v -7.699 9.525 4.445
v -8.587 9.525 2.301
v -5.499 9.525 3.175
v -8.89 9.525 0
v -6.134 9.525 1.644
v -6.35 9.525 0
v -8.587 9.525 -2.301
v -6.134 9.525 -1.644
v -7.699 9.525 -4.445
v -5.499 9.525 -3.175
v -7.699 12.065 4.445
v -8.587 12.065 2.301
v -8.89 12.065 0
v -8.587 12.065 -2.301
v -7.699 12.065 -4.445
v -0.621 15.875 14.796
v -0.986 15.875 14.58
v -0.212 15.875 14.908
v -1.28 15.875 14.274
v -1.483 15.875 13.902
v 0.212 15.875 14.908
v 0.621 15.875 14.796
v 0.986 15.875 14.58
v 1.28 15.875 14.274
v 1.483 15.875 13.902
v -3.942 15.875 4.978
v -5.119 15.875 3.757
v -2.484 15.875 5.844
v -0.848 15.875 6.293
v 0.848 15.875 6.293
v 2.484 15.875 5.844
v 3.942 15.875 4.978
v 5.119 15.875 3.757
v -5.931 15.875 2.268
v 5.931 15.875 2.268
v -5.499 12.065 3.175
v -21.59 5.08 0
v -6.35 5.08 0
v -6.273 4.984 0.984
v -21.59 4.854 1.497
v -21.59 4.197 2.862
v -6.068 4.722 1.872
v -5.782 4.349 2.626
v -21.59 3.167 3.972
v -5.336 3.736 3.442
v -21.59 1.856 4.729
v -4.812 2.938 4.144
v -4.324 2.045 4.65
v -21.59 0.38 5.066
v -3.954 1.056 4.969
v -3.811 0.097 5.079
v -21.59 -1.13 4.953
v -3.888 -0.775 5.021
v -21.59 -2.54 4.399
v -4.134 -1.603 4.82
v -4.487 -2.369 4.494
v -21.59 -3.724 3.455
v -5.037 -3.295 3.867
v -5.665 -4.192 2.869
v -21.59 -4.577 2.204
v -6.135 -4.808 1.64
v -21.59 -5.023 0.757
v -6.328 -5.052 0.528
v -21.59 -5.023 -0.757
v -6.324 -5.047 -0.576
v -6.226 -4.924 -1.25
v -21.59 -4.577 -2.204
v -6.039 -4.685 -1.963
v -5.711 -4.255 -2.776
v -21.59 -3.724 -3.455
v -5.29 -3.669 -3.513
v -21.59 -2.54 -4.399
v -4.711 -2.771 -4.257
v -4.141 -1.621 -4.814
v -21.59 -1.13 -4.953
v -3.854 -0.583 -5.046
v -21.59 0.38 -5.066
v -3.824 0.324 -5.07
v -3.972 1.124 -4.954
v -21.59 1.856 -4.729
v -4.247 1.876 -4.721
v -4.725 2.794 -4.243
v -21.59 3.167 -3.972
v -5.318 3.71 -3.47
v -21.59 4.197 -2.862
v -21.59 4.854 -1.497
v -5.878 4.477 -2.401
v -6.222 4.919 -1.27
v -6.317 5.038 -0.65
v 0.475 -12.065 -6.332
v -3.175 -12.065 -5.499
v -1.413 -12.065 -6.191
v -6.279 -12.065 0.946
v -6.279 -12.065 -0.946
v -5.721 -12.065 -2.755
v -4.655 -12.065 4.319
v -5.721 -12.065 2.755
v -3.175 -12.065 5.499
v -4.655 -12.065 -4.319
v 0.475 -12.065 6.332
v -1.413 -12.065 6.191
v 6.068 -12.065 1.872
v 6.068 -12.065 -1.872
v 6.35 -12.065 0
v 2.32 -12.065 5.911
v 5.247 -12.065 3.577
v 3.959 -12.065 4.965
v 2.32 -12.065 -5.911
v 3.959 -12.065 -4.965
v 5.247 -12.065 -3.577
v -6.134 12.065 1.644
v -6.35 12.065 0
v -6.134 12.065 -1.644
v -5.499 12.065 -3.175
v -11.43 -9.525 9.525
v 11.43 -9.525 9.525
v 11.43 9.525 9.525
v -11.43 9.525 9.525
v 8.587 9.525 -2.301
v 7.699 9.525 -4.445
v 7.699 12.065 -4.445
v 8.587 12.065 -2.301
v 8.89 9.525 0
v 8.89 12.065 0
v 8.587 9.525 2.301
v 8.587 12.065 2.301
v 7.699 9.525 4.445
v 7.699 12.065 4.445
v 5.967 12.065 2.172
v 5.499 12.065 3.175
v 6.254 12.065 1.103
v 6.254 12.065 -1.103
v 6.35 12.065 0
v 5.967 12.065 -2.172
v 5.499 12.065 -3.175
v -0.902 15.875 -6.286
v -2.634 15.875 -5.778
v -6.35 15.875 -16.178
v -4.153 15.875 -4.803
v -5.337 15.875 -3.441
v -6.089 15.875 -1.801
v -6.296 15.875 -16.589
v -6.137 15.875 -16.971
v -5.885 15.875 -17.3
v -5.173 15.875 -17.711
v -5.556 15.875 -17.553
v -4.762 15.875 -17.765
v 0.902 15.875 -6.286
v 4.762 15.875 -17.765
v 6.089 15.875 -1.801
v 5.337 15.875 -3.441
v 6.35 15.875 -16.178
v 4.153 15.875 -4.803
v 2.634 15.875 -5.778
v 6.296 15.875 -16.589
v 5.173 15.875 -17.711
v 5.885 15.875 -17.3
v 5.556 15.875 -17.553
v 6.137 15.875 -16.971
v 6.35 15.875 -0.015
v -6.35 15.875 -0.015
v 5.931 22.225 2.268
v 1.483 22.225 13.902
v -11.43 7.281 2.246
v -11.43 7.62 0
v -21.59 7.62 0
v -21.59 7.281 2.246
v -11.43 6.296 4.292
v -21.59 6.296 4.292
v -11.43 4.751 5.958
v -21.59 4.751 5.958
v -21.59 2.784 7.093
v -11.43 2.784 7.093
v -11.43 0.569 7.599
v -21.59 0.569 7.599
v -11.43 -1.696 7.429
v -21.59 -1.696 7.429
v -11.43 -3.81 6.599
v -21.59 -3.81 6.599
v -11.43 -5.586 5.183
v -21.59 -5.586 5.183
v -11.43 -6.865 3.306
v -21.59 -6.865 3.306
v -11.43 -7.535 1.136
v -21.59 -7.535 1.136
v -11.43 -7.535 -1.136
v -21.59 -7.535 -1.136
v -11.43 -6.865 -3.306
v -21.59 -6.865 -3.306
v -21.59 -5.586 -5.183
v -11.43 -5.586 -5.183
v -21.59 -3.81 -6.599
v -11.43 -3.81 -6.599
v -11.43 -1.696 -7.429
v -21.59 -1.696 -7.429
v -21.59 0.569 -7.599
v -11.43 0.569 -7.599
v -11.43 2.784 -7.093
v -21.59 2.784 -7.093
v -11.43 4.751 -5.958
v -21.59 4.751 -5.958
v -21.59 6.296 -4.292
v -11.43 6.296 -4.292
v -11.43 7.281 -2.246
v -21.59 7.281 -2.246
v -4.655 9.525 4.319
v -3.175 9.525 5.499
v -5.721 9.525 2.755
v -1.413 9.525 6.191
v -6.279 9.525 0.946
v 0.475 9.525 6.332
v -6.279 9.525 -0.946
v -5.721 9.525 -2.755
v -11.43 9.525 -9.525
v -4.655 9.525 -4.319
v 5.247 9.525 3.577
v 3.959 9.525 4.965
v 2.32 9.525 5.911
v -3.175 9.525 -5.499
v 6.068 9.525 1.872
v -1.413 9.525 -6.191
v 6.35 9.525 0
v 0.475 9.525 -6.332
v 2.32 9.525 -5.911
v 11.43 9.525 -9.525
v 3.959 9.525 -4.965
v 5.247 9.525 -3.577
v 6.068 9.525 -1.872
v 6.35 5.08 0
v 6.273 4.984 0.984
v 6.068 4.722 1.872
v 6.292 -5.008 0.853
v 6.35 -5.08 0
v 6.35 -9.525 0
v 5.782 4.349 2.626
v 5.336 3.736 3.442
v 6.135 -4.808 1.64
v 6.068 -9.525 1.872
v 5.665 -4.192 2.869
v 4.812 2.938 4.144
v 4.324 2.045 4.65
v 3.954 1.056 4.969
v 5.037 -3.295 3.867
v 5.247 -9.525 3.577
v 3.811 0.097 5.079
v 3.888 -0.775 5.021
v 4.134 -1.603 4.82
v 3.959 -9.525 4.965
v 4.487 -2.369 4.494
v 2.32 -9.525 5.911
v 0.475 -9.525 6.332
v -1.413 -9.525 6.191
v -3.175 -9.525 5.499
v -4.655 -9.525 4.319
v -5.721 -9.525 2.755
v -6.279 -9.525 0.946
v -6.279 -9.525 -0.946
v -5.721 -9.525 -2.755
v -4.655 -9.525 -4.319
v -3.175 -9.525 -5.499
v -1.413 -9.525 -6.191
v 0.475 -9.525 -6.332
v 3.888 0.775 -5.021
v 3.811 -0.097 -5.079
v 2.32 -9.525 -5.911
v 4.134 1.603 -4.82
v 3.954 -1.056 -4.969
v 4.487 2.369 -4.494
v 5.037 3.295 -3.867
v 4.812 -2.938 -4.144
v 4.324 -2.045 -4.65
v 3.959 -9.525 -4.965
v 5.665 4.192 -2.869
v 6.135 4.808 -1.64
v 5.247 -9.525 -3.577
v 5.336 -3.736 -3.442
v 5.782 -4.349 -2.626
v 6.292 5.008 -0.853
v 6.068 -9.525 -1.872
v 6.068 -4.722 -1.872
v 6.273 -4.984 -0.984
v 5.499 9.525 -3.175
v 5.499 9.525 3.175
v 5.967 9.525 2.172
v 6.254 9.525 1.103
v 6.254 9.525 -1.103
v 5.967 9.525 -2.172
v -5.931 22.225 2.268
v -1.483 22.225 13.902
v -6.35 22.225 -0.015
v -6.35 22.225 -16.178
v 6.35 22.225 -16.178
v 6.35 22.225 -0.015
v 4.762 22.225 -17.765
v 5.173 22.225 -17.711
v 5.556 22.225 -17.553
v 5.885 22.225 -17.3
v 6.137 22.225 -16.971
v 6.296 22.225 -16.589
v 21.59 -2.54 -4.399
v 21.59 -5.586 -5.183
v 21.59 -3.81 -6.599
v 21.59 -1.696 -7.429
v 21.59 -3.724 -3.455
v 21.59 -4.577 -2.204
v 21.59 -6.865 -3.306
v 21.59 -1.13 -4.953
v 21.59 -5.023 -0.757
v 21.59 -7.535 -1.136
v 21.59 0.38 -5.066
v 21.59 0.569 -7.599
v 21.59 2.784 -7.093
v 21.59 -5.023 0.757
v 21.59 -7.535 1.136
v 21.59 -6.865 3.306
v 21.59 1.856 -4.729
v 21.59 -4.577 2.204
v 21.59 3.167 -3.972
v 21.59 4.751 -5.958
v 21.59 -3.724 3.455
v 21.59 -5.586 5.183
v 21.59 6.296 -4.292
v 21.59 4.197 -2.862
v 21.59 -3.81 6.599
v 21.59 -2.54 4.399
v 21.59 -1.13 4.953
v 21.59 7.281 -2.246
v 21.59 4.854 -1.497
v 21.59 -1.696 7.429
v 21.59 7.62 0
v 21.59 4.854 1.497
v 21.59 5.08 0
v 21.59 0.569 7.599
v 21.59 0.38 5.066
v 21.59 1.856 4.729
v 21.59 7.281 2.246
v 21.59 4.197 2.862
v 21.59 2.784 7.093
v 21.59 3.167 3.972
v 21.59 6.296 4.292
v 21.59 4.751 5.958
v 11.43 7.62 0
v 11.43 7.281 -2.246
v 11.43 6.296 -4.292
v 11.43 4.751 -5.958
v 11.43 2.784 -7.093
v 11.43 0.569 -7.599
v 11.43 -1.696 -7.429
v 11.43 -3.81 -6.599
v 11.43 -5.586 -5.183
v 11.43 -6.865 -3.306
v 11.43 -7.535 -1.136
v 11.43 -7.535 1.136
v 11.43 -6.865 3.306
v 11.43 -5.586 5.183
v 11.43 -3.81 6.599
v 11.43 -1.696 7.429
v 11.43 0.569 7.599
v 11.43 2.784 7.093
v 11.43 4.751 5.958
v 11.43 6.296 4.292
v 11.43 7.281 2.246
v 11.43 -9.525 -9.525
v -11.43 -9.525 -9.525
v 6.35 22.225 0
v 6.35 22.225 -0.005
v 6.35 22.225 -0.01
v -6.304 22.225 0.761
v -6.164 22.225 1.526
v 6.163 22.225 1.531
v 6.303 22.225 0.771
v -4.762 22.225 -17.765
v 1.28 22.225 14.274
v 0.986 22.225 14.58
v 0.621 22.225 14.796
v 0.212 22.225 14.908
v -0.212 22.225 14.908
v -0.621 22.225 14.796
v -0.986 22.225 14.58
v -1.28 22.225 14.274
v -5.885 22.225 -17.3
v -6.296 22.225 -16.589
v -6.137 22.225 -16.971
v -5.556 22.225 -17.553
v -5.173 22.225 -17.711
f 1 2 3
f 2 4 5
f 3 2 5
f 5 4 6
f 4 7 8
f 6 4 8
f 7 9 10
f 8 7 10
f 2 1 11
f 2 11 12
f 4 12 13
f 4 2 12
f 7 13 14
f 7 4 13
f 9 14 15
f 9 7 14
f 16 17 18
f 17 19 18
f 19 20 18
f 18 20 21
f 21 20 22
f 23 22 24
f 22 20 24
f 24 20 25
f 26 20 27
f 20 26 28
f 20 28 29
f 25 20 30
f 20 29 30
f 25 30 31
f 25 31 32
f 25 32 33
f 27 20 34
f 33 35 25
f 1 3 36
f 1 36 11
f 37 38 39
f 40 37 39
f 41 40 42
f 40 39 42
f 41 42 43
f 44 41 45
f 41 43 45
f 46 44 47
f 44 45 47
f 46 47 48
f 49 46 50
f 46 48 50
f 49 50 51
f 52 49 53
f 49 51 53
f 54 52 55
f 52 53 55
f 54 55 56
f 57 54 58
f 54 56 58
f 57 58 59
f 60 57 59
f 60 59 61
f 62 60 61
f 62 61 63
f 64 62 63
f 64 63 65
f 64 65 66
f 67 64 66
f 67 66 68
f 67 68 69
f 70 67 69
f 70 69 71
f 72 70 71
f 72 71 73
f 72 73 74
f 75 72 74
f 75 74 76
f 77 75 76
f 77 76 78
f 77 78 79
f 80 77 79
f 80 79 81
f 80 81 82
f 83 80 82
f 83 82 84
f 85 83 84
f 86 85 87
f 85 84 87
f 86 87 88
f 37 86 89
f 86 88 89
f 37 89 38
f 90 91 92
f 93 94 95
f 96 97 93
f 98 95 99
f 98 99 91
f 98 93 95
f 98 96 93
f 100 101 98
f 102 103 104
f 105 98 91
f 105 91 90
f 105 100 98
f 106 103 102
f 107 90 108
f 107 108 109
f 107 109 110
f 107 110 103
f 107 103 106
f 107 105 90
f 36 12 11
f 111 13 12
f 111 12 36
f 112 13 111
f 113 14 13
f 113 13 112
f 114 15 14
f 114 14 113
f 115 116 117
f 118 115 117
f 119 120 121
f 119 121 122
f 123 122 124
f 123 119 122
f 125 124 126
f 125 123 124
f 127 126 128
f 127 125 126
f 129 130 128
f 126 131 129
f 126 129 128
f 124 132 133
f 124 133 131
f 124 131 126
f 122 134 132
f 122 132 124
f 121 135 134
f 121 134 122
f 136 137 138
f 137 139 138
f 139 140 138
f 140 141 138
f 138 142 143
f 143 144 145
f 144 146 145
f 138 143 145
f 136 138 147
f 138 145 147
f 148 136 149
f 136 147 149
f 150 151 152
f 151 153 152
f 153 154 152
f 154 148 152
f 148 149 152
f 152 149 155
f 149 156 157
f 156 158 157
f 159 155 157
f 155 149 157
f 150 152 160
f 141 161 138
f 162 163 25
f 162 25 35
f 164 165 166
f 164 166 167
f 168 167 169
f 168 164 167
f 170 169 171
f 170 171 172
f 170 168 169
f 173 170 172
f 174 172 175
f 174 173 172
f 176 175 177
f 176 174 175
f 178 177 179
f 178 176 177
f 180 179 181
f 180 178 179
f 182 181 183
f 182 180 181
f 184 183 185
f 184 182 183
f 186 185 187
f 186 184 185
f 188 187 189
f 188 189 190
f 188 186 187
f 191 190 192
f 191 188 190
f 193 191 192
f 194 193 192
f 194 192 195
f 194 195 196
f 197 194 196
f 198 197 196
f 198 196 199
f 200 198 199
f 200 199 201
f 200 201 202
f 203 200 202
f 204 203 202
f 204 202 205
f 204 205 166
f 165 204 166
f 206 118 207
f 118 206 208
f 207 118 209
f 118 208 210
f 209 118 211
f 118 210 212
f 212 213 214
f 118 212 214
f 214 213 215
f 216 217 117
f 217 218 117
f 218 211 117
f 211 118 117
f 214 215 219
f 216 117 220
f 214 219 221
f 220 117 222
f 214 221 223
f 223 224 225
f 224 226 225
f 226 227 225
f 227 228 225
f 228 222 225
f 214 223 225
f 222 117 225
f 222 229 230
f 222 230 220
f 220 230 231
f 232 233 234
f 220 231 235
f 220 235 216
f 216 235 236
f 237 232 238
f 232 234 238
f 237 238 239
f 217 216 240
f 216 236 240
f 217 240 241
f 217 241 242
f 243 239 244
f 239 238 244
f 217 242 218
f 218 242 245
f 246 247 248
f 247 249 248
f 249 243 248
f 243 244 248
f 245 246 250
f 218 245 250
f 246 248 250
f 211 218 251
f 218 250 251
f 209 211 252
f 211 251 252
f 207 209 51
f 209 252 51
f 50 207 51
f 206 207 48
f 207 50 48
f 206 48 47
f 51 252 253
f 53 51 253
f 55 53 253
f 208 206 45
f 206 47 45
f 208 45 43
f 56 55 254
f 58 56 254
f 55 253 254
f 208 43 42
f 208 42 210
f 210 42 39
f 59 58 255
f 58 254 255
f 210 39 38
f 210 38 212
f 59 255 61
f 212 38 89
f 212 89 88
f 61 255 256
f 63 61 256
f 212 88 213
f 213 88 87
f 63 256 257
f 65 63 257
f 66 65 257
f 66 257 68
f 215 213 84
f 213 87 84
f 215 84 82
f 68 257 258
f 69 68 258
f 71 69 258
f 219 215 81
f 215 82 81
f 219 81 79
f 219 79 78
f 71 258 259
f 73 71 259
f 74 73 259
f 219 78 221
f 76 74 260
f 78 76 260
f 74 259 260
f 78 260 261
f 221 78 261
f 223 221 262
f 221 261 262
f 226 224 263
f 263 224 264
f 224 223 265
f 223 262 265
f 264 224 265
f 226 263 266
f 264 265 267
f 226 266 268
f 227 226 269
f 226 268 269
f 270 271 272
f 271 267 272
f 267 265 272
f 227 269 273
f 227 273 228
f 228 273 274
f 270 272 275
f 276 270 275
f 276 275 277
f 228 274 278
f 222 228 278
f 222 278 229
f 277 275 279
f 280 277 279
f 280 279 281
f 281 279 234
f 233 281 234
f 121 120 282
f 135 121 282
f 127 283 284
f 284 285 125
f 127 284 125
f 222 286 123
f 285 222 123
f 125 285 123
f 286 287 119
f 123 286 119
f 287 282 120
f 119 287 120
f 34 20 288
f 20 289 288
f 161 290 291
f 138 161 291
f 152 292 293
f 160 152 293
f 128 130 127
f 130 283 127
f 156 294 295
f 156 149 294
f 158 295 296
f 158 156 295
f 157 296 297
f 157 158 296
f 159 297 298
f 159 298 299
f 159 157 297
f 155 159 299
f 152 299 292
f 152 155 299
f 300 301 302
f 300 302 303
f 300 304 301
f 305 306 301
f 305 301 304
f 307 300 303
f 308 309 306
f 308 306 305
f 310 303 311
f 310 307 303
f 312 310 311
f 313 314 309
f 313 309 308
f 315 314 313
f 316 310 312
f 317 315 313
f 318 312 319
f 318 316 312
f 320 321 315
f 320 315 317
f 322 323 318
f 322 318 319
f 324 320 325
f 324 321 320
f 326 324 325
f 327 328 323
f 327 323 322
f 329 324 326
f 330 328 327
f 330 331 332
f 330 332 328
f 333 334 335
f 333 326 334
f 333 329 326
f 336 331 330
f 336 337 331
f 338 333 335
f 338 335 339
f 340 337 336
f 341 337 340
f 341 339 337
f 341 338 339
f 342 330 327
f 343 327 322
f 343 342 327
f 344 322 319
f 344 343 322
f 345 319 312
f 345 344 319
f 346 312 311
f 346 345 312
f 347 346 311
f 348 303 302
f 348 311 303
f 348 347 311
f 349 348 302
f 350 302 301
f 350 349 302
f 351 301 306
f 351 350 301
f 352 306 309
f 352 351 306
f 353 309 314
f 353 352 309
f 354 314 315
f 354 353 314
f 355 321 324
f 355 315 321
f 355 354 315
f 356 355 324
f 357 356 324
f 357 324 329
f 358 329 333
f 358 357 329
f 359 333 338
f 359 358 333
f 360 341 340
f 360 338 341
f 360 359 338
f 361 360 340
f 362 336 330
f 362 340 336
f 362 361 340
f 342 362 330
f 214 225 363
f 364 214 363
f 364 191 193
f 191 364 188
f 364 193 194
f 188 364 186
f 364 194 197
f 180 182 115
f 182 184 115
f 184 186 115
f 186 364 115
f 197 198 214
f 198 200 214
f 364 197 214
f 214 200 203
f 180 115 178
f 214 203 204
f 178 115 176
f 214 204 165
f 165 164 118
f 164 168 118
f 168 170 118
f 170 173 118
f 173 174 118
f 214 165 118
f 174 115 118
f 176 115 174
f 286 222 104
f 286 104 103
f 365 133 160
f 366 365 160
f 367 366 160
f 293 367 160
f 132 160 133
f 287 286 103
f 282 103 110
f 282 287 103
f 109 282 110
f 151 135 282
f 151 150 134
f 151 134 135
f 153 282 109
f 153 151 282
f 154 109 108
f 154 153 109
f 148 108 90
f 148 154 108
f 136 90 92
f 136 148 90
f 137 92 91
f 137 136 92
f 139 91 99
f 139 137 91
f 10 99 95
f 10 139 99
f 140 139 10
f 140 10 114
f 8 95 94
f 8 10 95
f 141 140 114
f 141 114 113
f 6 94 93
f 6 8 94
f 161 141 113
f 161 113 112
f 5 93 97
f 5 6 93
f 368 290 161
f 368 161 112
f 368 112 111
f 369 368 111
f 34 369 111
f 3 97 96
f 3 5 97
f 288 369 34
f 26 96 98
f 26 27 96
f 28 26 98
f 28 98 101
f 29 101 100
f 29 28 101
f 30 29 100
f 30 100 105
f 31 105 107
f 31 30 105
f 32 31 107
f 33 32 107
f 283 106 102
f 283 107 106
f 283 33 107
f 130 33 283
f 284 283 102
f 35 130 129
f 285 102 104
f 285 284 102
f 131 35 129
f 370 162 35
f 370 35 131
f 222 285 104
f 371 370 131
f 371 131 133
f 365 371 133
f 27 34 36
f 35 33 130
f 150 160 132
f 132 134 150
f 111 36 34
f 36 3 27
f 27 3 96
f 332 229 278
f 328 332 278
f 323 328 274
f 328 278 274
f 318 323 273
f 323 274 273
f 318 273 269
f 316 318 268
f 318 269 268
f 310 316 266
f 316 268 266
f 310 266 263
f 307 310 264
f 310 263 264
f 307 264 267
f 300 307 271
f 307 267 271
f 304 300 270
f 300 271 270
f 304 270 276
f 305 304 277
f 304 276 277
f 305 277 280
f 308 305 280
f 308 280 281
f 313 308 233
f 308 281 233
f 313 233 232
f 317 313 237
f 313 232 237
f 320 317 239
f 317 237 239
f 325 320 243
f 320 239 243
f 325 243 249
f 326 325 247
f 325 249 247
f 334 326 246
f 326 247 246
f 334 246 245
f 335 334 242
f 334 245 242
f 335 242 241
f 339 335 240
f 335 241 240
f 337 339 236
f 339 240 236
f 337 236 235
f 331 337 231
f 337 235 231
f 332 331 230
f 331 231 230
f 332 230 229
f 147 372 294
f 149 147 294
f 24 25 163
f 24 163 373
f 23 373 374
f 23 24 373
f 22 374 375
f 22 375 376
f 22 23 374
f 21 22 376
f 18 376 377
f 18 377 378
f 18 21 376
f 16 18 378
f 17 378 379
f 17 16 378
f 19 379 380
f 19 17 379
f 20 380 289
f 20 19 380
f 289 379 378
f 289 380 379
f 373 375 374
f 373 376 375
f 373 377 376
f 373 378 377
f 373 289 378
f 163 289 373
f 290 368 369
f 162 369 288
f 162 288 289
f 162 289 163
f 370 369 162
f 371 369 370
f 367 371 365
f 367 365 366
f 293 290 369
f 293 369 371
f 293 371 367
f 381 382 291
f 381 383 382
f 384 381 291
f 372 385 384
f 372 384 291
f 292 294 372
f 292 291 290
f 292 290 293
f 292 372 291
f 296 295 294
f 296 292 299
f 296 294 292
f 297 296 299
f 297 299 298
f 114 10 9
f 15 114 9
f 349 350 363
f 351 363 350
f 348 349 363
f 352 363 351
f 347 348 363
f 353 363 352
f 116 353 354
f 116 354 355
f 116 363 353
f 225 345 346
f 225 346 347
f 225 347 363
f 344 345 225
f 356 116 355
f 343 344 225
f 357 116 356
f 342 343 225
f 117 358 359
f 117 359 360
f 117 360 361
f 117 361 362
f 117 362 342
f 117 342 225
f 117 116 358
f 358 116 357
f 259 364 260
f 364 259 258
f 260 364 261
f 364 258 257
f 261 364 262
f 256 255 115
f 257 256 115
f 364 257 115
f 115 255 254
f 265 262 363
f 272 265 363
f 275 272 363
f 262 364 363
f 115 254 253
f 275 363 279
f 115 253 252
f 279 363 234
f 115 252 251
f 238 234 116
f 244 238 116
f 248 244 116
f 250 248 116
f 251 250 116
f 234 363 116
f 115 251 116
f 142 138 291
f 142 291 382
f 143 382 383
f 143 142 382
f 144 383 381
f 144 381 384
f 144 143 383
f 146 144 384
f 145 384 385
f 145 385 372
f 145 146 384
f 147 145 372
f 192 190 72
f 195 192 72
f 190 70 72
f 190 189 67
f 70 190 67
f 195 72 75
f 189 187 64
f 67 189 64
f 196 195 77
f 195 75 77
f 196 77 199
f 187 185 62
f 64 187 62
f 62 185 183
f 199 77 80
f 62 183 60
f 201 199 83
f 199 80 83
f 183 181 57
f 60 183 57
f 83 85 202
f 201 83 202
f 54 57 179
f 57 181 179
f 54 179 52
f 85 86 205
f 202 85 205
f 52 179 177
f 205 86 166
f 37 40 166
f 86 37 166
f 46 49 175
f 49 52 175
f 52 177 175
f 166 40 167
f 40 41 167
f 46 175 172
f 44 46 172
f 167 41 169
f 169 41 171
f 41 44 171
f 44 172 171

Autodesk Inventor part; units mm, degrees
ref_plane "YZ Plane" through (0, 0, 0) normal (1, 0, 0) x (0, 1, 0)
ref_plane "XZ Plane" through (0, 0, 0) normal (0, 1, 0) x (-1, 0, 0)
ref_plane "XY Plane" through (0, 0, 0) normal (0, 0, 1) x (1, 0, 0)
sketch "Sketch1" plane through (0, 0, 0) normal (1, 0, 0) x (0, 1, 0)
  line L0 (-9.525, 9.525) -> (9.525, 9.525)
  line L1 (9.525, 9.525) -> (9.525, -9.525)
  line L2 (9.525, -9.525) -> (-9.525, -9.525)
  line L3 (-9.525, -9.525) -> (-9.525, 9.525)
  line L4 (-9.525, 9.525) -> (9.525, -9.525) construction
  line L5 (9.525, 9.525) -> (-9.525, -9.525) construction
  circle A0 centre (0, 0) radius 5.08
  circle A1 centre (0, 0) radius 7.62
  dimension "d0" = 19.05
  dimension "d1" = 19.05
  dimension "d2" = 10.16
  dimension "d5" = 15.24
extrude "Extrusion1" add sketch "Sketch1" along normal mid plane 22.86 contours L0 L1 L2 L3 | A1
extrude "Extrusion2" add sketch "Sketch1" along normal mid plane 43.18 contours A1
sketch "Sketch2" plane through (-11.43, -9.525, -9.525) normal (0, -1, 0) x (1, 0, 0)
  circle A0 centre (11.43, 9.525) radius 6.35
  dimension "d8" = 12.7
extrude "Extrusion3" cut sketch "Sketch2" against normal through all
sketch "Sketch3" plane through (-11.43, -9.525, -9.525) normal (0, -1, 0) x (1, 0, 0)
  circle A0 centre (11.43, 9.525) radius 6.35 projected
extrude "Extrusion4" add sketch "Sketch3" along normal blind 2.54 separate body
sketch "Sketch4" plane through (0, -9.525, 0) normal (0, 1, 0) x (1, 0, 0)
  circle A0 centre (0, 0) radius 6.35 projected
extrude "Extrusion5" add sketch "Sketch4" along normal blind 31.75 bodies 2
sketch "Sketch5" plane through (-11.43, 9.525, 9.525) normal (0, 1, 0) x (1, 0, 0)
  circle A0 centre (11.43, 9.525) radius 6.35 construction
  circle A1 centre (11.43, 9.525) radius 8.89 construction
  line L0 (2.54, 9.525) -> (20.32, 9.525) construction
  line L1 (3.731, 5.08) -> (19.129, 13.97) construction
  line L2 (3.731, 13.97) -> (19.129, 5.08) construction
  circle A2 centre (11.43, 9.525) radius 6.35 construction
  arc A3 (16.9293, 6.35) -> (16.9293, 12.7) centre (11.43, 9.525) ccw
  arc A4 (19.129, 5.08) -> (19.129, 13.97) centre (11.43, 9.525) ccw
  arc A5 (5.9307, 12.7) -> (5.9307, 6.35) centre (11.43, 9.525) ccw
  arc A6 (3.731, 13.97) -> (3.731, 5.08) centre (11.43, 9.525) ccw
  line L3 (5.9307, 12.7) -> (3.731, 13.97)
  line L4 (5.9307, 6.35) -> (3.731, 5.08)
  line L5 (19.129, 13.97) -> (16.9293, 12.7)
  line L6 (16.9293, 6.35) -> (19.129, 5.08)
  dimension "d15" = 17.78
  dimension "d16" = 30
  dimension "d17" = 30
extrude "Extrusion6" add sketch "Sketch5" along normal blind 2.54 bodies 2
sketch "Sketch6" plane through (0, 22.225, 0) normal (0, 1, 0) x (1, 0, 0)
  circle A0 centre (0, 0) radius 6.35 projected
  line L0 (0, 0) -> (0, 17.78) construction
  circle A1 centre (0, 0) radius 6.35 construction
  line L1 (-6.35, 17.7652) -> (6.35, 17.7652)
  line L2 (6.35, 17.7652) -> (6.35, 0.0148)
  line L3 (6.35, 0.0148) -> (-6.35, 0.0148)
  line L4 (-6.35, 0.0148) -> (-6.35, 17.7652)
  line L5 (-6.35, 17.7652) -> (6.35, 0.0148) construction
  line L6 (6.35, 17.7652) -> (-6.35, 0.0148) construction
  line L7 (0, 0) -> (0, -17.78) construction
  line L8 (0, -17.78) -> (5.9312, -2.2679)
  line L9 (0, -17.78) -> (-5.9312, -2.2679)
  circle A2 centre (0, 0) radius 6.35 projected
  point P0 (0, 8.89)
  dimension "d20" = 17.78
  dimension "d21" = 17.78
extrude "Extrusion7" add sketch "Sketch6" against normal blind 6.35 bodies 2
fillet "Fillet1" radius 1.5875 3 edges at (0, 19.05, 17.78) (6.35, 19.05, -17.7652) (-6.35, 19.05, -17.7652)
properties part number "BBBB" material "Brass"
